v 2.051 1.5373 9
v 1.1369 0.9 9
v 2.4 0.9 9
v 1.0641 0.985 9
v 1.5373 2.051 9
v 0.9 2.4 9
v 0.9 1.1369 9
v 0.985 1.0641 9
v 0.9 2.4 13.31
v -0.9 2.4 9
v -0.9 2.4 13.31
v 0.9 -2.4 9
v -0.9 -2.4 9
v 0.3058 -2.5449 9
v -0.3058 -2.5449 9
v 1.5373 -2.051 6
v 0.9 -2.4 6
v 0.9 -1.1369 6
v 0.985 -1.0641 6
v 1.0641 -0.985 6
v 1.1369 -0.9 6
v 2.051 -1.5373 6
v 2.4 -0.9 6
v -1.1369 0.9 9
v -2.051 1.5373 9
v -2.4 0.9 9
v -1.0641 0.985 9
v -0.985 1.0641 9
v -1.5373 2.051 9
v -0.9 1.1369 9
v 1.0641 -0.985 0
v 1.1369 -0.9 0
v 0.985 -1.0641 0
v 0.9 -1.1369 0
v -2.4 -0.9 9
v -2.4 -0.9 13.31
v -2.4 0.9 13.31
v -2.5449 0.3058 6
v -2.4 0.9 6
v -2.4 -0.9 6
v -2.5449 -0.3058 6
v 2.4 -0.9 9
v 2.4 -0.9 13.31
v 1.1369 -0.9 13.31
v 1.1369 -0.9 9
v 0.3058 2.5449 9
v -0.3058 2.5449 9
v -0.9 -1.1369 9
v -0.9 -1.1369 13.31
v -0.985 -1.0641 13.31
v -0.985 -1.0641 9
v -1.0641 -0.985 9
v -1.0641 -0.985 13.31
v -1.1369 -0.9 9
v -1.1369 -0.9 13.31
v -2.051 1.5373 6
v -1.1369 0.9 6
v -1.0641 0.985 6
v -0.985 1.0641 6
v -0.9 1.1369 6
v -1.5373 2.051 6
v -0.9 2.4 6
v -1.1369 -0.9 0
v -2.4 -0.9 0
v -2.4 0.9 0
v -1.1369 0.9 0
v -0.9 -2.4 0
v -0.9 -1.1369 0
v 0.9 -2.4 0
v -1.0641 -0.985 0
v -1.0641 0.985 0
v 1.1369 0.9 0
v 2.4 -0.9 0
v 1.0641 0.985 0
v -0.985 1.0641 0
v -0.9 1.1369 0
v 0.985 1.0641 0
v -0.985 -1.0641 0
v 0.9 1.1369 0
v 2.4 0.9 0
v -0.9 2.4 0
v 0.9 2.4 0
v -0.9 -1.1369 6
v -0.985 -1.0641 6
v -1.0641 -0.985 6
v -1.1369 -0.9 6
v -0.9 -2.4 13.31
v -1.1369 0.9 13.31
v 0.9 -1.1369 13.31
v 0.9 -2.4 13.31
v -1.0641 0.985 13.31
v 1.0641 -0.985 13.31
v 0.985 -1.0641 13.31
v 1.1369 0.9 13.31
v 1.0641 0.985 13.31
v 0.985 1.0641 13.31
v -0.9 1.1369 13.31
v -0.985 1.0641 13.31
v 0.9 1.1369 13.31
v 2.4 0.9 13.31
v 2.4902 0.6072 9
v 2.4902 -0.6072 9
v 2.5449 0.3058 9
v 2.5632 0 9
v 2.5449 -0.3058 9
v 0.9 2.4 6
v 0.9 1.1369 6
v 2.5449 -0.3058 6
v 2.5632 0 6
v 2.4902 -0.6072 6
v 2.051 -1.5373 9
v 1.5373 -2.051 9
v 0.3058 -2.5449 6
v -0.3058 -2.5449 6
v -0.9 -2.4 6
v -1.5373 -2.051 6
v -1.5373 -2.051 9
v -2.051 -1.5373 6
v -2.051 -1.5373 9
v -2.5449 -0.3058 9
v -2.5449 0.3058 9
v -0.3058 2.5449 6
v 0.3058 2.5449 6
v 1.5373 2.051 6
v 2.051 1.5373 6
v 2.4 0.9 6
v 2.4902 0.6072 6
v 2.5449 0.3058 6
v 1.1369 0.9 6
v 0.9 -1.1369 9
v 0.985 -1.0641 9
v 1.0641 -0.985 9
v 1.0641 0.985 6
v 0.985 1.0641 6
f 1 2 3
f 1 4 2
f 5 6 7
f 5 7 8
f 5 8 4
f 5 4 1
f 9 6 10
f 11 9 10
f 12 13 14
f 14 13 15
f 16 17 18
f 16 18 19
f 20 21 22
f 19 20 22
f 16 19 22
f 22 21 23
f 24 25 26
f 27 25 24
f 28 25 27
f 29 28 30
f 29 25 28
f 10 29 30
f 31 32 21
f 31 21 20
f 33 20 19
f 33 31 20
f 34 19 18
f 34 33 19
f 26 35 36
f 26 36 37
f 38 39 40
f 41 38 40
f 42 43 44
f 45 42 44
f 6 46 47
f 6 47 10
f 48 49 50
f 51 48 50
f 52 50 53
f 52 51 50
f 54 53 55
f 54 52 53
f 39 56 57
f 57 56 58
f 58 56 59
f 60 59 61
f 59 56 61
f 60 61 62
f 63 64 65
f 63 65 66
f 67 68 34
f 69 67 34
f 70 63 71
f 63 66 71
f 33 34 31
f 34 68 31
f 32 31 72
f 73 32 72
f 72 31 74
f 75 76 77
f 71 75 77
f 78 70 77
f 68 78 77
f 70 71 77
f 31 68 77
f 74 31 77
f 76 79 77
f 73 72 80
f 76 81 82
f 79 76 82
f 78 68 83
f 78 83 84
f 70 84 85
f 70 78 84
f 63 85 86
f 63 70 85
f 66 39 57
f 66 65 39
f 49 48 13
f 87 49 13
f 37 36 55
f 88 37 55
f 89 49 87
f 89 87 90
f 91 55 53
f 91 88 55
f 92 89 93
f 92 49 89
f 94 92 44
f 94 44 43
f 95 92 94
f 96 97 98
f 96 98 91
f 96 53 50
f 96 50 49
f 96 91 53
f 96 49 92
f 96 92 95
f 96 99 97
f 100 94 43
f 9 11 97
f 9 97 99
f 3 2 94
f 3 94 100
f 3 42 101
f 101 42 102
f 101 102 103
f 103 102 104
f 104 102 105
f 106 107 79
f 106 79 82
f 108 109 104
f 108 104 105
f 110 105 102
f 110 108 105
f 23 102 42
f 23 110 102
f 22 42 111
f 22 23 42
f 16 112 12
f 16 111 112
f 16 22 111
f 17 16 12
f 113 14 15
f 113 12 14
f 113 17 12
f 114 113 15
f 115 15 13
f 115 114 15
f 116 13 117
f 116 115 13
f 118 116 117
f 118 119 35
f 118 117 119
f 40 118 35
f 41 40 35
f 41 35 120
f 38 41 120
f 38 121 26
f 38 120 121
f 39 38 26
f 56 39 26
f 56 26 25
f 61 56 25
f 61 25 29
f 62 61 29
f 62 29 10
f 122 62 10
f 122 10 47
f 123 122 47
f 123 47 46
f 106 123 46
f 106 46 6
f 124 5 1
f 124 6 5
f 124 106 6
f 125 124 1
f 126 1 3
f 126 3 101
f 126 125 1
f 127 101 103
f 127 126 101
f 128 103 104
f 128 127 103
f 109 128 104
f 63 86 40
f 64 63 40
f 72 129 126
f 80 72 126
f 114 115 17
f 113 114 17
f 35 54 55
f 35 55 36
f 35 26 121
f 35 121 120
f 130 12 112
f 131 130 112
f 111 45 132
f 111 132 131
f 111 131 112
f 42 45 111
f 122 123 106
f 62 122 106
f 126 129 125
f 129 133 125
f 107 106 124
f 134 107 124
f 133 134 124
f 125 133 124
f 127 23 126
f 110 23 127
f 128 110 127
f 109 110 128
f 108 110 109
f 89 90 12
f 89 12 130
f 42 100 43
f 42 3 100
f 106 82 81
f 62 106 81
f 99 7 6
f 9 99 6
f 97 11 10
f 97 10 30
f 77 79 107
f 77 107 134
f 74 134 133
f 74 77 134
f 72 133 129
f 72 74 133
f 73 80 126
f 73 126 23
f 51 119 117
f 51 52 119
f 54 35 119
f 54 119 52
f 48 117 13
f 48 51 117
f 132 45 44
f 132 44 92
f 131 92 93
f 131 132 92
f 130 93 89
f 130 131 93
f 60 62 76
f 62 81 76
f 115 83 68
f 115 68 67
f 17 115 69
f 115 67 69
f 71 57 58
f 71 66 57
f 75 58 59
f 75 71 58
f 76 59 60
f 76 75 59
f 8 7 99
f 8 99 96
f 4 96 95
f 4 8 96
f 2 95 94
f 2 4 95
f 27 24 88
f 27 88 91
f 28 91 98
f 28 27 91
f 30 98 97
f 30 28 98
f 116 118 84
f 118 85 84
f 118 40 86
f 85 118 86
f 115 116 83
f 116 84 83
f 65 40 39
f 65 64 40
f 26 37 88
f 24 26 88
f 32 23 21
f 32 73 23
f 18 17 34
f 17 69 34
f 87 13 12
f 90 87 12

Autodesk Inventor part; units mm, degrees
ref_plane "YZ Plane" through (0, 0, 0) normal (1, 0, 0) x (0, 1, 0)
ref_plane "XZ Plane" through (0, 0, 0) normal (0, 1, 0) x (-1, 0, 0)
sketch "Boceto1" plane through (0, 0, 0) normal (0, 0, 1) x (1, 0, 0)
  line L0 (-0.9, -2.4) -> (0.9, -2.4)
  line L1 (0.9, -2.4) -> (0.9, 2.4)
  line L2 (0.9, 2.4) -> (-0.9, 2.4)
  line L3 (-0.9, 2.4) -> (-0.9, -2.4)
  line L4 (-0.9, -2.4) -> (0.9, 2.4) construction
  line L5 (0.9, -2.4) -> (-0.9, 2.4) construction
  line L6 (2.4, -0.9) -> (-2.4, -0.9)
  line L7 (-2.4, -0.9) -> (-2.4, 0.9)
  line L8 (-2.4, 0.9) -> (2.4, 0.9)
  line L9 (2.4, 0.9) -> (2.4, -0.9)
  line L10 (2.4, -0.9) -> (-2.4, 0.9) construction
  line L11 (-2.4, -0.9) -> (2.4, 0.9) construction
  circle A0 centre (0, 0) radius 1.45
  point P0 (1.1369, 0.9)
  point P1 (0.9, 1.1369)
  point P2 (-0.9, 1.1369)
  point P3 (-1.1369, 0.9)
  point P4 (-1.1369, -0.9)
  point P5 (-0.9, -1.1369)
  point P6 (0.9, -1.1369)
  point P7 (1.1369, -0.9)
  dimension "d14" = 2.9
  dimension "d15" = 1.8
  dimension "d16" = 4.8
extrude "Extrusión1" add sketch "Boceto1" along normal blind 13.31
ref_plane "Plano de trabajo1" through (0, 0, 6) normal (0, 0, 1) x (1, 0, 0)
sketch "Boceto2" plane through (0, 0, 6) normal (0, 0, 1) x (1, 0, 0)
  line L0 (2.4, 0.9) -> (1.1369, 0.9) construction
  circle A0 centre (0, 0) radius 2.5632
extrude "Extrusión2" add sketch "Boceto2" along normal blind 3
properties part number "EjeCortoGrua"
